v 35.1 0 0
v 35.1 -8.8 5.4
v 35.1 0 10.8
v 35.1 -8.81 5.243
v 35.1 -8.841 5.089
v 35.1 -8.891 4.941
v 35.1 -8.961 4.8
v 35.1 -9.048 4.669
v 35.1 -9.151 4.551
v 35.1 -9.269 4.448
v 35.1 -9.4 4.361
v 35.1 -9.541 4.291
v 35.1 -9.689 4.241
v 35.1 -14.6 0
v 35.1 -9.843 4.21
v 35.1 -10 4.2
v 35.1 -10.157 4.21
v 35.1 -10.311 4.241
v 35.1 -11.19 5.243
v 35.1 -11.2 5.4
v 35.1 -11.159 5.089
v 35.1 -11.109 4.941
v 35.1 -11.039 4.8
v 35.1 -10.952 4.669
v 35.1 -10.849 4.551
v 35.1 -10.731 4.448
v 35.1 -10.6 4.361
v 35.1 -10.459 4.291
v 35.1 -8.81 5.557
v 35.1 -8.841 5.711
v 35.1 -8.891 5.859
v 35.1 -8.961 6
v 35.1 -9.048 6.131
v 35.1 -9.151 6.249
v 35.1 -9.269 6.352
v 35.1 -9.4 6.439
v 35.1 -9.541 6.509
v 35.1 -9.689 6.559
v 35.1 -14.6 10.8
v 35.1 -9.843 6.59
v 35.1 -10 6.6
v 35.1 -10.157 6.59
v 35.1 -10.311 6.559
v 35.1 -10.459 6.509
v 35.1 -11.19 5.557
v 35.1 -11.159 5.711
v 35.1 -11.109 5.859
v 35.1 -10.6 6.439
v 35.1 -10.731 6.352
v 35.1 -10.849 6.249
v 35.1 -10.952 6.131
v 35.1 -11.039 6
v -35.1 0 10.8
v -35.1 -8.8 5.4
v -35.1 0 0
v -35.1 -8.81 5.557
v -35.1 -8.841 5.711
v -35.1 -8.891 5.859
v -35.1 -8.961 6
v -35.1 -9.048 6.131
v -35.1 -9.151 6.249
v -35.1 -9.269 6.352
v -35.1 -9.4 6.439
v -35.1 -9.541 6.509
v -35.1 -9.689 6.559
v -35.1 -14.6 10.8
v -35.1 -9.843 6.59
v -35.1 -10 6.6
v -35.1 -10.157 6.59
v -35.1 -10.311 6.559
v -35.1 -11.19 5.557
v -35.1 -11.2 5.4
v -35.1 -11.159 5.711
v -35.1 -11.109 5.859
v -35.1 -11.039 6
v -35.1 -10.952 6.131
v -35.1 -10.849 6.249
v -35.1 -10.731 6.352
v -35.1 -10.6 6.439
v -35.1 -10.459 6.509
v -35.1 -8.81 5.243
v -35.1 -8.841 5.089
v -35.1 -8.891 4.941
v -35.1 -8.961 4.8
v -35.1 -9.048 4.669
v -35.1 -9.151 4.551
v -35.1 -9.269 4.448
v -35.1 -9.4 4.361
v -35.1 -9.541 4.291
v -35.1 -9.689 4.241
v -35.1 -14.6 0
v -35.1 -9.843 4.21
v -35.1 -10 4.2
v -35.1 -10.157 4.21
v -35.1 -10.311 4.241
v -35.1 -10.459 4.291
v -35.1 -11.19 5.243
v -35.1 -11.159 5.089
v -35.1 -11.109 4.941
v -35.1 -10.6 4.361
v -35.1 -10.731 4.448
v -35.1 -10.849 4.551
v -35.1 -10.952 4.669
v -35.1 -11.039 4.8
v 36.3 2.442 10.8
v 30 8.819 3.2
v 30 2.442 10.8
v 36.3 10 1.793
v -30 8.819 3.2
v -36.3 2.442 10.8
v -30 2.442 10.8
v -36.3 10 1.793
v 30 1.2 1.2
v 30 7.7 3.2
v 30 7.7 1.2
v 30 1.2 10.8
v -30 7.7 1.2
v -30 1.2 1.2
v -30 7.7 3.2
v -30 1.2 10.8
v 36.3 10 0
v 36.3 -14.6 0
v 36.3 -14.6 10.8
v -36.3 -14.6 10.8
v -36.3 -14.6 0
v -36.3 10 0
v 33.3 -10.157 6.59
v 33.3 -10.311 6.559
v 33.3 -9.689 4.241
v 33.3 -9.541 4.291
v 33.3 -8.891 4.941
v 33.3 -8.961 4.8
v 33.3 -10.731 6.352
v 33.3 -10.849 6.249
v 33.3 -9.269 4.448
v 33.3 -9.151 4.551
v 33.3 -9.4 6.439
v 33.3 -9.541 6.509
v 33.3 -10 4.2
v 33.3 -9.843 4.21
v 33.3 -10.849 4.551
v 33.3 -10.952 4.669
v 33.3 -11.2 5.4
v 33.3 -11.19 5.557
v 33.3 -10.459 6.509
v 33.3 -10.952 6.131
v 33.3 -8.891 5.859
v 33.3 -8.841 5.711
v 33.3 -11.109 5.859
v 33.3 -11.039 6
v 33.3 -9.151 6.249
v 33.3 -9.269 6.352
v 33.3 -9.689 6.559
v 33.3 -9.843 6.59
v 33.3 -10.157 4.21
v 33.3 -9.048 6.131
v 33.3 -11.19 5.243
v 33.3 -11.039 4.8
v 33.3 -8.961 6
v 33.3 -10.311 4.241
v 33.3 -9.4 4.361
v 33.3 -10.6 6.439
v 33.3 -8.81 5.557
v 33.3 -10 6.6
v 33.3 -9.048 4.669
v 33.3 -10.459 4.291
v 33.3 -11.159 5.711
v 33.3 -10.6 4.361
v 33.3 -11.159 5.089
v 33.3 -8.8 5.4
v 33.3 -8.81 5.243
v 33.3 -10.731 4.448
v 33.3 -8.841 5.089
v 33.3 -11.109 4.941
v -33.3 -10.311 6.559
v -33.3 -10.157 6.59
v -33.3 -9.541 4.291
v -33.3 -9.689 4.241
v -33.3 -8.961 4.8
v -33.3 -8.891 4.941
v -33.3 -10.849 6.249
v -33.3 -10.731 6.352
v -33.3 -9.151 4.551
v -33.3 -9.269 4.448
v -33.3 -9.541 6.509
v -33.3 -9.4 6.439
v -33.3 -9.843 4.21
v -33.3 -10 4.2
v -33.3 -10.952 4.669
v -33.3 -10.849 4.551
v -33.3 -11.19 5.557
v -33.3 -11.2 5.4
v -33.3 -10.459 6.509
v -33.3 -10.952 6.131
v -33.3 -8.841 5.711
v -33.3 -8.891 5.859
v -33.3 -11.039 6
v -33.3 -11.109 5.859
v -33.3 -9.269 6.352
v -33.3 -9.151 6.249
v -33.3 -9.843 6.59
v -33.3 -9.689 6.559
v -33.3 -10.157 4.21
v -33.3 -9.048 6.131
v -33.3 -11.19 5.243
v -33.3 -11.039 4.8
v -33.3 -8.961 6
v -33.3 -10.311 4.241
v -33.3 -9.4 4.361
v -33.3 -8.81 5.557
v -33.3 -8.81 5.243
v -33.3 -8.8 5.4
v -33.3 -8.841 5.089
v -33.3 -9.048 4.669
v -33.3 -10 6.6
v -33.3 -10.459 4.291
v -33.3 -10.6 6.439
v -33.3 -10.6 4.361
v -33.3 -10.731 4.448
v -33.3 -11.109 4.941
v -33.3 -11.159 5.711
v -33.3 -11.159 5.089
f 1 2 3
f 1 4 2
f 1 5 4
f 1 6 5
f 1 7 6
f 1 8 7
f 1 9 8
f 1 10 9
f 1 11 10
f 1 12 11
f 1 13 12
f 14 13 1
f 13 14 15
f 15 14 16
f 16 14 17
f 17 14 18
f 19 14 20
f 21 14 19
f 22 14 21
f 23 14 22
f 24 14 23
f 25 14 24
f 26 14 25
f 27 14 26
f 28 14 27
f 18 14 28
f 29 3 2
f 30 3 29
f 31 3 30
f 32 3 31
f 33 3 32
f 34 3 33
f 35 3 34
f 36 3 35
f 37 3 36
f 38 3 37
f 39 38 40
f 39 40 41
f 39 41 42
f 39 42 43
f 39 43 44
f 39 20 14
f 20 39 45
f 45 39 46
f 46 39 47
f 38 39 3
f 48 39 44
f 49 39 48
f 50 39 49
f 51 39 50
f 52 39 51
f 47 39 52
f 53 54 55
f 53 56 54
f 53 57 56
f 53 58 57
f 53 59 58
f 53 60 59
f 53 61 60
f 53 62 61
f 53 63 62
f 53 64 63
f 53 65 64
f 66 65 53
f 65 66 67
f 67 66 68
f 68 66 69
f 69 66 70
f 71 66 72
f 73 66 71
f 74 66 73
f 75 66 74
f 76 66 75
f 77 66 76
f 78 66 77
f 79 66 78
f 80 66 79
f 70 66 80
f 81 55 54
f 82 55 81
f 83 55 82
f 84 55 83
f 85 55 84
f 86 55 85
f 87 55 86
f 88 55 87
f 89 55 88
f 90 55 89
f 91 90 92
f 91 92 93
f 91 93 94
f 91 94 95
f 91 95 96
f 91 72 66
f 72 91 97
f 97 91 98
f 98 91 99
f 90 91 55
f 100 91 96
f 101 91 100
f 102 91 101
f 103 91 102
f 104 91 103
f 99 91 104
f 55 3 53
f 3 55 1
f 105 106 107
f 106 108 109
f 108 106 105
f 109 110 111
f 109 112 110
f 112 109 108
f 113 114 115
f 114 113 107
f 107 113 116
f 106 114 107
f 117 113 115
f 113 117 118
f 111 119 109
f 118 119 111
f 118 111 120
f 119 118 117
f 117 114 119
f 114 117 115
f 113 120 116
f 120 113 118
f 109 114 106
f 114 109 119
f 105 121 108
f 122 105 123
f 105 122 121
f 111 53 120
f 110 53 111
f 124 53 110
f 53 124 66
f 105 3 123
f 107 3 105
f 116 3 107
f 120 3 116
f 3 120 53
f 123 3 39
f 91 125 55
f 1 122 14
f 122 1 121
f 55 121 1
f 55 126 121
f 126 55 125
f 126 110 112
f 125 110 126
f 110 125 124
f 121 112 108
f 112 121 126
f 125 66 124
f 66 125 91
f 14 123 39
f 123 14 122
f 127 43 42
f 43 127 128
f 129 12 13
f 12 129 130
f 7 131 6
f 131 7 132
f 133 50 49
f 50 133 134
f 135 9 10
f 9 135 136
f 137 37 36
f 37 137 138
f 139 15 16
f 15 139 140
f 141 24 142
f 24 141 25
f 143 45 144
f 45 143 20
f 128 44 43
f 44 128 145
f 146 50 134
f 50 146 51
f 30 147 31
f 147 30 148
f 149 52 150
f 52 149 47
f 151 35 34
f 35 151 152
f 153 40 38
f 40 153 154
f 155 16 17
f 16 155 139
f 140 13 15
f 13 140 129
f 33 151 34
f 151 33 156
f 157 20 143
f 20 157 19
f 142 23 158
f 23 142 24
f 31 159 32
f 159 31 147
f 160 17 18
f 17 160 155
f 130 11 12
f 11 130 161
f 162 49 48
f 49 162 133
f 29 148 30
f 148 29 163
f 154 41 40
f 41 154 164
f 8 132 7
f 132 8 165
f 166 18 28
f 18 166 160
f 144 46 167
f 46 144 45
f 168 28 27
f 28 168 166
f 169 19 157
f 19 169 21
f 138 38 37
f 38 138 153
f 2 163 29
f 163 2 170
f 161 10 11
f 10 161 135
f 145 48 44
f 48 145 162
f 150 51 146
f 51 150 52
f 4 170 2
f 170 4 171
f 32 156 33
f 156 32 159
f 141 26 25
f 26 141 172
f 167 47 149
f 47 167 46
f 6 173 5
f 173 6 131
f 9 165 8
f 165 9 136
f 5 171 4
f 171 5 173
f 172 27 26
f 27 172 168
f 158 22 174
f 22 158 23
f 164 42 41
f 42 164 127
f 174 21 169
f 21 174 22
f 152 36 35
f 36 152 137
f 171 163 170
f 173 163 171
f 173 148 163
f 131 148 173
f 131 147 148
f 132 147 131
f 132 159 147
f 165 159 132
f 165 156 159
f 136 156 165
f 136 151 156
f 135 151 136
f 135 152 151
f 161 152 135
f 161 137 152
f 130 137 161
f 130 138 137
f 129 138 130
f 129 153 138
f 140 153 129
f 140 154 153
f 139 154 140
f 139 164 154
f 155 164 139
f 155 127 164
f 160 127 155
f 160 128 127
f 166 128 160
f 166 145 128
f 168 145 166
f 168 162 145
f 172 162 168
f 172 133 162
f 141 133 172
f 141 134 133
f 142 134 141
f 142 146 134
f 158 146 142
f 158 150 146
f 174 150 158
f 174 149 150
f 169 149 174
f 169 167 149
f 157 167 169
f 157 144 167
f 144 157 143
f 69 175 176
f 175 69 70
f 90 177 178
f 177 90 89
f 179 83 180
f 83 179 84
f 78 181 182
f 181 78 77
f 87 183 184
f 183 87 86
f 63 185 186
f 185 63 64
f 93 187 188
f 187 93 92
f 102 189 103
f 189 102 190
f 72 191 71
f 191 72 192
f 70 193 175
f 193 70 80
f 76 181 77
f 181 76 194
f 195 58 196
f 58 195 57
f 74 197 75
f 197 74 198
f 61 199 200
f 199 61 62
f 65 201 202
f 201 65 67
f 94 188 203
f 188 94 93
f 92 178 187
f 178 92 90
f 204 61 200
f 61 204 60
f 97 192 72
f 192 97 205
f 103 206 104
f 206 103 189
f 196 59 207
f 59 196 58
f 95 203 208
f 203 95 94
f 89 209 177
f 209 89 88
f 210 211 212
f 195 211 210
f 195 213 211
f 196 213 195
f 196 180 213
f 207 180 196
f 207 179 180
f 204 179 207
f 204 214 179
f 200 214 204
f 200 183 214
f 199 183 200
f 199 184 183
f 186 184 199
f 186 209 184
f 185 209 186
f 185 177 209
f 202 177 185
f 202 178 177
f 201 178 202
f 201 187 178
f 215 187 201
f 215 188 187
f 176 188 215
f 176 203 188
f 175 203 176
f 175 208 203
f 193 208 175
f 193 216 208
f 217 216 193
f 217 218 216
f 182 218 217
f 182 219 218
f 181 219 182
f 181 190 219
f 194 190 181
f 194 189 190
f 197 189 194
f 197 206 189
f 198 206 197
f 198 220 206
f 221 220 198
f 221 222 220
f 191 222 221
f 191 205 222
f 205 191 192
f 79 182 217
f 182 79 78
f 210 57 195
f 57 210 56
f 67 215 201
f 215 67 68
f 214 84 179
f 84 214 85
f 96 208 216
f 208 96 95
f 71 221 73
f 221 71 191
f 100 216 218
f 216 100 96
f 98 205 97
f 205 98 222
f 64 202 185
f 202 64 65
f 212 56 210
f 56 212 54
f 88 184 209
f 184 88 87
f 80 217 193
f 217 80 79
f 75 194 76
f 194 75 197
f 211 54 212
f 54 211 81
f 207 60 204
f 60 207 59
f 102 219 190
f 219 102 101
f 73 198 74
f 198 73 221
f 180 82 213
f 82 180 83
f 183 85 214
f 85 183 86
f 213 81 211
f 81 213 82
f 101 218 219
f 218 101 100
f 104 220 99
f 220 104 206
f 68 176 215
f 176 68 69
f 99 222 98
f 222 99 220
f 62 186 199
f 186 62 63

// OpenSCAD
// ssdframe.scad
// a handle to plug a SSD into a DELL Latitude E6430 Notebook
//
// Background:
//   - CAD manual: http://www.openscad.org/documentation.html
//
//   - see also:
//     https://www.thingiverse.com/am_things/designs
//     https://github.com/Github6am/am_parts3D
//
// Andreas Merz 2022-01-22, v1.0 
// GPLv3 or later, see http://www.gnu.org/licenses



module ssdframe1(
     a1=70.2,  // ssd width
     a2=72.6,  // frame width
     b1=10,    // depth
     b2=24.6,  // overall depth
     c=10.8    // height
     ) {
     w=(a2-a1)/2;
         union() {
           difference() {
             union() {
               // outer shape
               translate([0, -b2/2+b1, c/2]) cube([a2,b2,c], center=true);
             }
             union() {
               // SSD bay
               translate([0,-b2/2, c/2-0.1]) cube([a1,b2,c+0.4], center=true);
               // slope
               translate([0,  b1+3.5, c/2]) rotate([40,0,0]) cube([a2+5,b1,30], center=true);
               // handle
               translate([0,  (b1-3.5)/2+w, c/2+w]) cube([60, b1-3.5, c], center=true);
               translate([0,  b1/2+w, c/2+w+2]) cube([60, b1, c], center=true);
             }
           }
           // pins
           translate([   a2/2-1.5,  -10, c/2]) rotate([0,90,0]) cylinder(d=2.4, h=3, $fn=48, center=true);
           translate([ -(a2/2-1.5), -10, c/2]) rotate([0,90,0]) cylinder(d=2.4, h=3, $fn=48, center=true);
         }
     }


//---------------- Instances ---------------------

ssdframe1();
